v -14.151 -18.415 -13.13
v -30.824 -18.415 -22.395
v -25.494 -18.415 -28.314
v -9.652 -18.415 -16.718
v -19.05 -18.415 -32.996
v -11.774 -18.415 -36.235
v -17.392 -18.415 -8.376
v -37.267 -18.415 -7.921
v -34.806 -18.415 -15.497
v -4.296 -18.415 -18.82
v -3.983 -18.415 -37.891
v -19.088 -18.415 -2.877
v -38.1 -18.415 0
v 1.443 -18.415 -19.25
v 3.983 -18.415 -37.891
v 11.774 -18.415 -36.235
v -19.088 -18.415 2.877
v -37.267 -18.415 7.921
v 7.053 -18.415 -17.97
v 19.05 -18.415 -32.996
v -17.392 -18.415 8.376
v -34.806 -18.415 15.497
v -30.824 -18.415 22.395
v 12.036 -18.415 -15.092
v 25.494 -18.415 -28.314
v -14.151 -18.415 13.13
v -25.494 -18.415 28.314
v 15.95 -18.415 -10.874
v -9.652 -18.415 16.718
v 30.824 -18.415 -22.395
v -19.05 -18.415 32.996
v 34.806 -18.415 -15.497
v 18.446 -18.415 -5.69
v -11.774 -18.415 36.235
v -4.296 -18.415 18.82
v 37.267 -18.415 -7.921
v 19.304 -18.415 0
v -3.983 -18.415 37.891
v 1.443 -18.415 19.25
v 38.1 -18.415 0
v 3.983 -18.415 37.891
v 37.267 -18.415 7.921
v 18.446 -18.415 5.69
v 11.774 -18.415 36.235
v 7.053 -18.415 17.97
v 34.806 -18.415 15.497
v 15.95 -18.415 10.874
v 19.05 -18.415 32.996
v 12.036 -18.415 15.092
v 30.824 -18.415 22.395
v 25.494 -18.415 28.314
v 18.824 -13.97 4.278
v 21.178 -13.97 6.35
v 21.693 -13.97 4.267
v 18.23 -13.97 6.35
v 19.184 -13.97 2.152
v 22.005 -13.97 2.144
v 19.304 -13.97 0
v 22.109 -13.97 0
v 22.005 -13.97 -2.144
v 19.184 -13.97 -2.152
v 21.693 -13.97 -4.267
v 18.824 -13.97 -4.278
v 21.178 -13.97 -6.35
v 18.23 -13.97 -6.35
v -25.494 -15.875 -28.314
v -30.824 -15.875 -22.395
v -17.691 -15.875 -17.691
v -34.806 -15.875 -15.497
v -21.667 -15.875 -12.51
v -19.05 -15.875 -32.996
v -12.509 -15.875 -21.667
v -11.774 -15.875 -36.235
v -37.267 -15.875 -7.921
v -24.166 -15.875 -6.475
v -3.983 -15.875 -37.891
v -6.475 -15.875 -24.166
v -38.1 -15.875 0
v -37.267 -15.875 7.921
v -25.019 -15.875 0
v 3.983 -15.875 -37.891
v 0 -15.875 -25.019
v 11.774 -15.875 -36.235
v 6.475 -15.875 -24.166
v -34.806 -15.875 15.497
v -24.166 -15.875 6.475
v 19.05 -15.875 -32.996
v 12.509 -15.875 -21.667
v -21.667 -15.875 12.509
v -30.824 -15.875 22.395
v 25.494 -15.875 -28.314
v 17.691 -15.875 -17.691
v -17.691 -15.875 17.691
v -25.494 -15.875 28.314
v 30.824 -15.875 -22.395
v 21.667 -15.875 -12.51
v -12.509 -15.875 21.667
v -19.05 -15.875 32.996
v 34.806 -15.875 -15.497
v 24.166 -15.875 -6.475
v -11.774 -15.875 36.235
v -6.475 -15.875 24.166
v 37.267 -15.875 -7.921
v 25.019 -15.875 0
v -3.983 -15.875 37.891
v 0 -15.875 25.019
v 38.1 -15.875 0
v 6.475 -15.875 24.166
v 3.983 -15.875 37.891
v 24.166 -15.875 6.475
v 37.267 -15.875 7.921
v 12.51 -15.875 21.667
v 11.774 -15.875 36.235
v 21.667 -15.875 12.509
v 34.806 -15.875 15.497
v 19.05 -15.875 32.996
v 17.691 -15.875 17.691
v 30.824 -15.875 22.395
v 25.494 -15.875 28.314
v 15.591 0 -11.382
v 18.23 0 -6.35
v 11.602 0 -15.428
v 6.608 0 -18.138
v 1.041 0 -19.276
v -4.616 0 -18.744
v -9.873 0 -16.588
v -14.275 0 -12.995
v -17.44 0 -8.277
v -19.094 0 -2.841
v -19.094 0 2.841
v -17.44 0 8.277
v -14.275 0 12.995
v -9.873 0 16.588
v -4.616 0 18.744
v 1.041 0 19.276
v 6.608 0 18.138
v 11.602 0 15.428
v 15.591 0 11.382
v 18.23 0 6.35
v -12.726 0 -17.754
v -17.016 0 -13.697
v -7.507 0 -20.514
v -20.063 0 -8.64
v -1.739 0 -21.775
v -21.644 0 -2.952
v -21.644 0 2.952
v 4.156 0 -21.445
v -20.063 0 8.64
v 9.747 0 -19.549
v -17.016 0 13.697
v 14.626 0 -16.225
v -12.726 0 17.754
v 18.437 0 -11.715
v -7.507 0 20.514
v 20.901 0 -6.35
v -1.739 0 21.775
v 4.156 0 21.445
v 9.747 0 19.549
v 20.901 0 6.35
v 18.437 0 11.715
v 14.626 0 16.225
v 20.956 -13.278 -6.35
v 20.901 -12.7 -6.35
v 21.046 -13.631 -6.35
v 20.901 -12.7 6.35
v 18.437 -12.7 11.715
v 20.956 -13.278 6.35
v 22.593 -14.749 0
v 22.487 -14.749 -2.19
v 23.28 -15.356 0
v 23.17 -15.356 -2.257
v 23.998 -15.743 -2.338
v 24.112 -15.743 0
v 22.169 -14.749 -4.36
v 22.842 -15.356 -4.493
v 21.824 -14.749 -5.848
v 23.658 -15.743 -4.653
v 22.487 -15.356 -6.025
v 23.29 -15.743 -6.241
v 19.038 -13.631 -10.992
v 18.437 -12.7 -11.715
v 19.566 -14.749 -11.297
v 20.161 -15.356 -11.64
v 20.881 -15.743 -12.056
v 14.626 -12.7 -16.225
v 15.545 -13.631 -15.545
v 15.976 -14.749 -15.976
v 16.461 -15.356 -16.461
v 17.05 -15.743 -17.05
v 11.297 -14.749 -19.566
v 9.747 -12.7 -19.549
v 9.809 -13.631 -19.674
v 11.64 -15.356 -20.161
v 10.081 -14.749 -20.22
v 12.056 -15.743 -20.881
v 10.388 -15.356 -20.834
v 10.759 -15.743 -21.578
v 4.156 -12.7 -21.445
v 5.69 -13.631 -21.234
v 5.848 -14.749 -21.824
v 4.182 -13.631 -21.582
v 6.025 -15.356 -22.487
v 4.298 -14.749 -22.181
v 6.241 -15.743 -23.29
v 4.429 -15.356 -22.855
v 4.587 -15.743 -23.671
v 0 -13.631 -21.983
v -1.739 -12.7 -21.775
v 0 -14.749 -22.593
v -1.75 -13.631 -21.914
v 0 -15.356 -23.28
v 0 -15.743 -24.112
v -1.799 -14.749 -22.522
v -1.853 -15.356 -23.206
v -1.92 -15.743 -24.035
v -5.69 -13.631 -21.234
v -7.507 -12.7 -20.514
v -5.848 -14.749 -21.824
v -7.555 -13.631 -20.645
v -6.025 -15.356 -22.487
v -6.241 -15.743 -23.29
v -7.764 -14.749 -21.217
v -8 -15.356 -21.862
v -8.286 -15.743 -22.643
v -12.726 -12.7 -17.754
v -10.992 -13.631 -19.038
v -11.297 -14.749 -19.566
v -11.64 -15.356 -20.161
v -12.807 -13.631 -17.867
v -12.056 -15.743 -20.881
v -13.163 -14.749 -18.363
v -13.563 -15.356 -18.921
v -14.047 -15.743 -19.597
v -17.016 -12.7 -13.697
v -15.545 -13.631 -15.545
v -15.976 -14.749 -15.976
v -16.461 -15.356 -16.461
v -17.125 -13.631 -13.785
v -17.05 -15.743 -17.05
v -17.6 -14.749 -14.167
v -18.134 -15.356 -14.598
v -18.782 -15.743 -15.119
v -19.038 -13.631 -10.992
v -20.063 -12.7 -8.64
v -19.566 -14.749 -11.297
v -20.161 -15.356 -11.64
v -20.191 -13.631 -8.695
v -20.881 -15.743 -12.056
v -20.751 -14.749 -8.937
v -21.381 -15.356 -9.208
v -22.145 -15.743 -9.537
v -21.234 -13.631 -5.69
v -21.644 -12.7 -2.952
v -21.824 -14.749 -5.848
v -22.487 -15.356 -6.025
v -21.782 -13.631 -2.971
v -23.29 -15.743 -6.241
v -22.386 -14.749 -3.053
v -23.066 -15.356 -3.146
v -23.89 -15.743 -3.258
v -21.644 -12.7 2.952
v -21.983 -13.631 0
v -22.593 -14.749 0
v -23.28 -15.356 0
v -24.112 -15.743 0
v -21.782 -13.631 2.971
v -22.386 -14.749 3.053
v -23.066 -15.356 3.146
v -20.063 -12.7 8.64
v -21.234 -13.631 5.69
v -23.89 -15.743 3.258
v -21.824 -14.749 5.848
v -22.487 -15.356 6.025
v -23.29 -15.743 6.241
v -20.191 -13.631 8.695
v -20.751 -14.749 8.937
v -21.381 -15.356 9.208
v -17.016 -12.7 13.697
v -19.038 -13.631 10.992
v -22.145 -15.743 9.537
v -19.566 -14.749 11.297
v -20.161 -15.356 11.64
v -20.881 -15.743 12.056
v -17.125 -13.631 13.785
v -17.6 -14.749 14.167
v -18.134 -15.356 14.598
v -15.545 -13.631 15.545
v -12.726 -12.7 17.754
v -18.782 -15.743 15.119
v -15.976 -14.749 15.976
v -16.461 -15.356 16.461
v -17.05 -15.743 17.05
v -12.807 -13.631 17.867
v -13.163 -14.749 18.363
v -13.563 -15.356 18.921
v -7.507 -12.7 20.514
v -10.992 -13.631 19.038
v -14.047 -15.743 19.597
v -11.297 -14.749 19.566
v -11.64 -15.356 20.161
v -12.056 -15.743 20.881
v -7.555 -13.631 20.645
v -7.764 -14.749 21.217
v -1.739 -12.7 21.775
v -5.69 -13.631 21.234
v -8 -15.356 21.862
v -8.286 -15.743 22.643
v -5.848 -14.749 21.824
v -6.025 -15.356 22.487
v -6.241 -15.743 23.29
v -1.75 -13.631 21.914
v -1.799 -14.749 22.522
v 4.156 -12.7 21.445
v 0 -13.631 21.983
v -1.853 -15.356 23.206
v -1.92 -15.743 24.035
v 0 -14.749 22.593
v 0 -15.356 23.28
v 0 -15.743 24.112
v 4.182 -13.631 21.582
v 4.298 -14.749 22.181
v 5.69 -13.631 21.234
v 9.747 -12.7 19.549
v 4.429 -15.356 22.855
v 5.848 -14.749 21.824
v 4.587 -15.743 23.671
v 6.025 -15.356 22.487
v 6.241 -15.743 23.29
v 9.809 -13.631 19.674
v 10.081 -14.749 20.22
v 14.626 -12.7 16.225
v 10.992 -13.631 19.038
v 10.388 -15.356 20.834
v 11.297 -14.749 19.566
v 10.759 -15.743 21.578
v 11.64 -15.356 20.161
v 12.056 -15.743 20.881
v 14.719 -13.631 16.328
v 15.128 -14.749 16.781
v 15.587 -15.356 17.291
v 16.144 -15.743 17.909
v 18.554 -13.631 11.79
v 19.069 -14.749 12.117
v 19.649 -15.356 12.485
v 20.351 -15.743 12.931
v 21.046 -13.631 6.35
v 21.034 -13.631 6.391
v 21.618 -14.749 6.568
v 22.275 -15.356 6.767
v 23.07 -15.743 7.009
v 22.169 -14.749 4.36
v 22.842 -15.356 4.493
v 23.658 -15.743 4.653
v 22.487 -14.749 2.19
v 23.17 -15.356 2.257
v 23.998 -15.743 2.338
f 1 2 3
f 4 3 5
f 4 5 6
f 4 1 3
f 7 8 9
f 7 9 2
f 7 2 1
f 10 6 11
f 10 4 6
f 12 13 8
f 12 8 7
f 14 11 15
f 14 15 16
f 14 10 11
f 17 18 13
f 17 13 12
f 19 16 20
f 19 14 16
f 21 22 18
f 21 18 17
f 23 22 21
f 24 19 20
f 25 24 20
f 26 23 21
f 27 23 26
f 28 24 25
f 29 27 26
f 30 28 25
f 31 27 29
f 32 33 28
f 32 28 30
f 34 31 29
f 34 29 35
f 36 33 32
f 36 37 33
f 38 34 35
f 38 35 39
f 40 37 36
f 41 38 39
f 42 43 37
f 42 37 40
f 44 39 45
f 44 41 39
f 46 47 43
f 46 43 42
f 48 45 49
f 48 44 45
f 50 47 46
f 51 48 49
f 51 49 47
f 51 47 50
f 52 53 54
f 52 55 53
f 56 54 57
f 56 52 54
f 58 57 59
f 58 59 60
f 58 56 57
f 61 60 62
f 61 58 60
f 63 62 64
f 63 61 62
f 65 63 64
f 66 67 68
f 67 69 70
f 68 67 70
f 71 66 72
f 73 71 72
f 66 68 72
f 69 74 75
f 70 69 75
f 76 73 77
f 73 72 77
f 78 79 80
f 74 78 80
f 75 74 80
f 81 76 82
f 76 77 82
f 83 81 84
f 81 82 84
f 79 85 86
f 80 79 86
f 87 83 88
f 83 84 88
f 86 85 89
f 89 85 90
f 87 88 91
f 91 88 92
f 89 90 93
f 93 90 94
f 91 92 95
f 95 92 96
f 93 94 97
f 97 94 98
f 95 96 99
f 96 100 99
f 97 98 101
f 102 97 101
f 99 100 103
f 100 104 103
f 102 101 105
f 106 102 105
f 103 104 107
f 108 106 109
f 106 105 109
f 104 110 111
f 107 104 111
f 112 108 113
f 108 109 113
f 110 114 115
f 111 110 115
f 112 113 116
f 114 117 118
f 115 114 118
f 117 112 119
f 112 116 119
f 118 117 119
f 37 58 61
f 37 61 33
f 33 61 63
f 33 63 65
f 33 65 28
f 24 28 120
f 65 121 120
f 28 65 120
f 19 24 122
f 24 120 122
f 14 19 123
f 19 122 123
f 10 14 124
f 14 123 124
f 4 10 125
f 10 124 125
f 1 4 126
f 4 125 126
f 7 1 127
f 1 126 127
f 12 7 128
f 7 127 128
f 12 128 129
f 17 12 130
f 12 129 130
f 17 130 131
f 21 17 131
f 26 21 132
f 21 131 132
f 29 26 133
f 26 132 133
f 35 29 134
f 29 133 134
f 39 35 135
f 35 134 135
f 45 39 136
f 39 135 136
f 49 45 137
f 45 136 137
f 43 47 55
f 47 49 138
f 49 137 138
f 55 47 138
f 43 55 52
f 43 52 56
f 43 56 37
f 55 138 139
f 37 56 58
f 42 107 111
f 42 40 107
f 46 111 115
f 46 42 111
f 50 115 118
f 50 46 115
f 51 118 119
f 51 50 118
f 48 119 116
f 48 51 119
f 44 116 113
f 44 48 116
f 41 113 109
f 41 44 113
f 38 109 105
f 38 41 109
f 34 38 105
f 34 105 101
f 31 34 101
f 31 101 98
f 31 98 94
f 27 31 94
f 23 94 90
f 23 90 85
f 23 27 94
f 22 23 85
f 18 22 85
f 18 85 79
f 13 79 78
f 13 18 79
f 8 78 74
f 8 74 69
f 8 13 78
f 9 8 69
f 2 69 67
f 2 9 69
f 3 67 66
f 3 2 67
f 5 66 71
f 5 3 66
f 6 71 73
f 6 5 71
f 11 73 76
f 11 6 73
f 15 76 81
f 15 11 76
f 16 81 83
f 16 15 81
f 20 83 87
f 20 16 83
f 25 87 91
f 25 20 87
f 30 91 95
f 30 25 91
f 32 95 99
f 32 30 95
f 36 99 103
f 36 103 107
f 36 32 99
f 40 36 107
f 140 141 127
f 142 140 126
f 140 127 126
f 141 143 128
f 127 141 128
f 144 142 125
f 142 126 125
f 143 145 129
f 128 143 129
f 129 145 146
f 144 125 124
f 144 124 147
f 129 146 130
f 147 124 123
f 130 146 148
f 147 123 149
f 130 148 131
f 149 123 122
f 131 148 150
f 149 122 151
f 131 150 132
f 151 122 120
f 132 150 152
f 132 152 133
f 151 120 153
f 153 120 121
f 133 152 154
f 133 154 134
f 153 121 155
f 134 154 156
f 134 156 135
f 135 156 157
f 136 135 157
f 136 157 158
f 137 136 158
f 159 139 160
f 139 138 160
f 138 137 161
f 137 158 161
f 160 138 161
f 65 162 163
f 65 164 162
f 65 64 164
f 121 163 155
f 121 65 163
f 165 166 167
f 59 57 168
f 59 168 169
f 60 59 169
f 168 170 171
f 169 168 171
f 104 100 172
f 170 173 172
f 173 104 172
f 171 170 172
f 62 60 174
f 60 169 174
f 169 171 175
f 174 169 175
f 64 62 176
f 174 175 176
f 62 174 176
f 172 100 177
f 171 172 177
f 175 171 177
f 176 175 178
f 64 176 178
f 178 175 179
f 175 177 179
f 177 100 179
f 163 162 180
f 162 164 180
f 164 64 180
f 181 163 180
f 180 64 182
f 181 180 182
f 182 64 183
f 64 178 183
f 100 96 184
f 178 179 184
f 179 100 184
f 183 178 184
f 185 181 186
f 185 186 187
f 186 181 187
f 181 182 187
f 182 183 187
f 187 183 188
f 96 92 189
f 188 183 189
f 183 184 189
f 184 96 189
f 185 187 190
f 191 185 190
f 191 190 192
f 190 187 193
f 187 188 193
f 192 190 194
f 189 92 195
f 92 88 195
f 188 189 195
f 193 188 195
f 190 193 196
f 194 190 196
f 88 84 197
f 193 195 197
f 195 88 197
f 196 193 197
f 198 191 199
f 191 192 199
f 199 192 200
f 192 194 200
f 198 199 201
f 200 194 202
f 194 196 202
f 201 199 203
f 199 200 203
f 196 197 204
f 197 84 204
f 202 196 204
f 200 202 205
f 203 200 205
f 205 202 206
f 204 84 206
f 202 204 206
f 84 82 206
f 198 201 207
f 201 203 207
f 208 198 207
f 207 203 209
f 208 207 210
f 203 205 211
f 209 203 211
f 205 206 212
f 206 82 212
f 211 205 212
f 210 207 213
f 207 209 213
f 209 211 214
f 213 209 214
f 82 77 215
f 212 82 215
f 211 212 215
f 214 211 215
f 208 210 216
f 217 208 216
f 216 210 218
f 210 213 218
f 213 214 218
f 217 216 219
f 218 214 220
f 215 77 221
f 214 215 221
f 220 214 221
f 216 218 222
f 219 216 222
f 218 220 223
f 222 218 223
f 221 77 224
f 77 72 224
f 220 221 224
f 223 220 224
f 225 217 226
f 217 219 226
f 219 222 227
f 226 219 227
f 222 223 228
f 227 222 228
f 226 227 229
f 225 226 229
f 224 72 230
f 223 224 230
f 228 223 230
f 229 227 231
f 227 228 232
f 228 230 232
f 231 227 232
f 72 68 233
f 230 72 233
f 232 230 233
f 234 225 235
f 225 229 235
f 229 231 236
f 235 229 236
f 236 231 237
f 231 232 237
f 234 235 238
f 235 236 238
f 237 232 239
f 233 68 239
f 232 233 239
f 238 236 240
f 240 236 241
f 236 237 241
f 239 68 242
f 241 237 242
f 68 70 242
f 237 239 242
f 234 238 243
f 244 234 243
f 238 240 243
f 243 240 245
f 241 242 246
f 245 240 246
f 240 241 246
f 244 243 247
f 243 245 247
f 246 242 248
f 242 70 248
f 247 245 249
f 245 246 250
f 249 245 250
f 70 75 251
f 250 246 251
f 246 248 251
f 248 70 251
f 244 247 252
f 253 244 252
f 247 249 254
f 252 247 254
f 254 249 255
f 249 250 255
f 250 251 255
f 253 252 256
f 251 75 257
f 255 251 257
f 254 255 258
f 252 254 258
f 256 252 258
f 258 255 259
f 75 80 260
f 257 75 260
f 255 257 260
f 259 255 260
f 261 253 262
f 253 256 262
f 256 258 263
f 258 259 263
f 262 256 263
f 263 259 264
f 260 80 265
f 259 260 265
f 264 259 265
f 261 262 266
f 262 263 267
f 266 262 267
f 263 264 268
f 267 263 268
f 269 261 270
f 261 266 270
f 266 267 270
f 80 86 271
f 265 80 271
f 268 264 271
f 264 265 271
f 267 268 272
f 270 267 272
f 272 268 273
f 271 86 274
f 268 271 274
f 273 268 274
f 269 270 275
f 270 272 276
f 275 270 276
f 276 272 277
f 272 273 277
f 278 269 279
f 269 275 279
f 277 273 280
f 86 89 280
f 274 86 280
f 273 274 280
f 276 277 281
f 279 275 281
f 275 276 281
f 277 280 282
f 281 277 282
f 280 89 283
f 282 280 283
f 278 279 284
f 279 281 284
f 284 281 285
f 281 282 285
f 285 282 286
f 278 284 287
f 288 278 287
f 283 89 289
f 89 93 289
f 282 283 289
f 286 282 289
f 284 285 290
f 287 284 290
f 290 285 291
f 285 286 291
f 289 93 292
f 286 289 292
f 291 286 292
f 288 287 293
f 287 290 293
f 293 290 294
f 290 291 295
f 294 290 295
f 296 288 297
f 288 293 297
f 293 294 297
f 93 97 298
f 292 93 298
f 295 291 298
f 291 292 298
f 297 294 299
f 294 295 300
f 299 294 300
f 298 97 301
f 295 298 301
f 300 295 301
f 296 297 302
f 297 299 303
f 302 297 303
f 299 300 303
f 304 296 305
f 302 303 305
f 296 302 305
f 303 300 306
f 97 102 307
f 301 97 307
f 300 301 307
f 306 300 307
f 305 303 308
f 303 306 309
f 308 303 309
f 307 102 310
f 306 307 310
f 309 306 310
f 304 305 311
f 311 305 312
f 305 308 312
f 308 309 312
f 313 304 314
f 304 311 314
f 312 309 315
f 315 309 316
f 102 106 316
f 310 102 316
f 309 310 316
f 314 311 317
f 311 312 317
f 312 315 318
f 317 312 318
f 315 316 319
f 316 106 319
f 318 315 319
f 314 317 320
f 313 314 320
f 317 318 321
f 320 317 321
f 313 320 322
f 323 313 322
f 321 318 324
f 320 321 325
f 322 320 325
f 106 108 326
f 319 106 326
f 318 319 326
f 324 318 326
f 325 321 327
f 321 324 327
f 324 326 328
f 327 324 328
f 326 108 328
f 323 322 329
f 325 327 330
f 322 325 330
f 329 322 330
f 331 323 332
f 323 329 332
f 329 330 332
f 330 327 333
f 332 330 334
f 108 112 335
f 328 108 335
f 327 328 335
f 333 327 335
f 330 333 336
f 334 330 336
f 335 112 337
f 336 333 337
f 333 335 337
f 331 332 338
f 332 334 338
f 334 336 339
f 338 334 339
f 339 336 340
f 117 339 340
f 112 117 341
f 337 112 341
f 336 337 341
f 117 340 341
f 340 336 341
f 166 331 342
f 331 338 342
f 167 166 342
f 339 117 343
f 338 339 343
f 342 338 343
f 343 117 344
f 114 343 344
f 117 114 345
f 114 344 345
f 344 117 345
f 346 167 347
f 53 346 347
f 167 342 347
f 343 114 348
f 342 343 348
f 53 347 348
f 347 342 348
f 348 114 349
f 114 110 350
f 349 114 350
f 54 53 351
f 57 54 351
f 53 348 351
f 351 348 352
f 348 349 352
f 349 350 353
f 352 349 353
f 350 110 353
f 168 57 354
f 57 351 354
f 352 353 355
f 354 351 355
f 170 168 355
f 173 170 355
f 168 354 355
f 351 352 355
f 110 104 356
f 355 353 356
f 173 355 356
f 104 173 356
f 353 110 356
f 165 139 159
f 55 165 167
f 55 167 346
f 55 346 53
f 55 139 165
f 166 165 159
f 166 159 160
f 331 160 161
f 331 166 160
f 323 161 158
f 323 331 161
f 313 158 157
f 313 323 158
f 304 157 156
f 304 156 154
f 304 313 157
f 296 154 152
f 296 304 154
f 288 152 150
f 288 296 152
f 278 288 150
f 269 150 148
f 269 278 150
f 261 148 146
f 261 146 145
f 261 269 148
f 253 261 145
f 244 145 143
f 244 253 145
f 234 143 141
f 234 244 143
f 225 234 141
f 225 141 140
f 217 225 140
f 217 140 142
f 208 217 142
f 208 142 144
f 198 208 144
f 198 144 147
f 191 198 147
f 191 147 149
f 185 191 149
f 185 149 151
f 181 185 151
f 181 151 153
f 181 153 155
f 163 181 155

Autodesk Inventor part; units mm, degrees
ref_plane "YZ Plane" through (0, 0, 0) normal (1, 0, 0) x (0, 1, 0)
ref_plane "XZ Plane" through (0, 0, 0) normal (0, 1, 0) x (-1, 0, 0)
ref_plane "XY Plane" through (0, 0, 0) normal (0, 0, 1) x (1, 0, 0)
sketch "Sketch1" plane through (0, 0, 0) normal (0, 0, 1) x (1, 0, 0)
  line L0 (21.844, 0) -> (21.844, -12.7)
  line L1 (25.019, -15.875) -> (38.1, -15.875)
  line L2 (38.1, -15.875) -> (38.1, -18.415)
  line L3 (38.1, -18.415) -> (19.304, -18.415)
  line L4 (19.304, -18.415) -> (19.304, 0)
  line L5 (19.304, 0) -> (21.844, 0)
  line L6 (0, 0) -> (27.9096, 0) construction
  arc A0 (21.844, -12.7) -> (25.019, -15.875) centre (25.019, -12.7) ccw
  line L7 (0, 0) -> (0, -18.415) construction
  dimension "d0" = 19.304
  dimension "d1" = 18.415
  dimension "d2" = 2.54
  dimension "d3" = 2.54
  dimension "d5" = 3.175
  dimension "d9" = 38.1
revolve "Revolution1" add sketch "Sketch1" angle 360 about axis through (0, 0, 0) along (0, -1, 0)
sketch "Sketch2" plane through (0, 0, 0) normal (1, 0, 0) x (0, 1, 0)
  line L0 (0, 0) -> (-26.67, 0) construction
  line L1 (-13.97, -6.35) -> (0, -6.35)
  line L2 (0, -6.35) -> (0, 6.35)
  line L3 (0, 6.35) -> (-13.97, 6.35)
  line L4 (-13.97, 6.35) -> (-13.97, -6.35)
  line L5 (-13.97, -6.35) -> (0, 6.35) construction
  line L6 (0, -6.35) -> (-13.97, 6.35) construction
  line L7 (0, 19.304) -> (0, -19.304) projected
  point P0 (-6.985, 0)
  dimension "d10" = 12.7
  dimension "d11" = 13.97
  dimension "d12" = 0
extrude "Extrusion1" cut sketch "Sketch2" along normal blind 22.86
properties part number "customWasher"
